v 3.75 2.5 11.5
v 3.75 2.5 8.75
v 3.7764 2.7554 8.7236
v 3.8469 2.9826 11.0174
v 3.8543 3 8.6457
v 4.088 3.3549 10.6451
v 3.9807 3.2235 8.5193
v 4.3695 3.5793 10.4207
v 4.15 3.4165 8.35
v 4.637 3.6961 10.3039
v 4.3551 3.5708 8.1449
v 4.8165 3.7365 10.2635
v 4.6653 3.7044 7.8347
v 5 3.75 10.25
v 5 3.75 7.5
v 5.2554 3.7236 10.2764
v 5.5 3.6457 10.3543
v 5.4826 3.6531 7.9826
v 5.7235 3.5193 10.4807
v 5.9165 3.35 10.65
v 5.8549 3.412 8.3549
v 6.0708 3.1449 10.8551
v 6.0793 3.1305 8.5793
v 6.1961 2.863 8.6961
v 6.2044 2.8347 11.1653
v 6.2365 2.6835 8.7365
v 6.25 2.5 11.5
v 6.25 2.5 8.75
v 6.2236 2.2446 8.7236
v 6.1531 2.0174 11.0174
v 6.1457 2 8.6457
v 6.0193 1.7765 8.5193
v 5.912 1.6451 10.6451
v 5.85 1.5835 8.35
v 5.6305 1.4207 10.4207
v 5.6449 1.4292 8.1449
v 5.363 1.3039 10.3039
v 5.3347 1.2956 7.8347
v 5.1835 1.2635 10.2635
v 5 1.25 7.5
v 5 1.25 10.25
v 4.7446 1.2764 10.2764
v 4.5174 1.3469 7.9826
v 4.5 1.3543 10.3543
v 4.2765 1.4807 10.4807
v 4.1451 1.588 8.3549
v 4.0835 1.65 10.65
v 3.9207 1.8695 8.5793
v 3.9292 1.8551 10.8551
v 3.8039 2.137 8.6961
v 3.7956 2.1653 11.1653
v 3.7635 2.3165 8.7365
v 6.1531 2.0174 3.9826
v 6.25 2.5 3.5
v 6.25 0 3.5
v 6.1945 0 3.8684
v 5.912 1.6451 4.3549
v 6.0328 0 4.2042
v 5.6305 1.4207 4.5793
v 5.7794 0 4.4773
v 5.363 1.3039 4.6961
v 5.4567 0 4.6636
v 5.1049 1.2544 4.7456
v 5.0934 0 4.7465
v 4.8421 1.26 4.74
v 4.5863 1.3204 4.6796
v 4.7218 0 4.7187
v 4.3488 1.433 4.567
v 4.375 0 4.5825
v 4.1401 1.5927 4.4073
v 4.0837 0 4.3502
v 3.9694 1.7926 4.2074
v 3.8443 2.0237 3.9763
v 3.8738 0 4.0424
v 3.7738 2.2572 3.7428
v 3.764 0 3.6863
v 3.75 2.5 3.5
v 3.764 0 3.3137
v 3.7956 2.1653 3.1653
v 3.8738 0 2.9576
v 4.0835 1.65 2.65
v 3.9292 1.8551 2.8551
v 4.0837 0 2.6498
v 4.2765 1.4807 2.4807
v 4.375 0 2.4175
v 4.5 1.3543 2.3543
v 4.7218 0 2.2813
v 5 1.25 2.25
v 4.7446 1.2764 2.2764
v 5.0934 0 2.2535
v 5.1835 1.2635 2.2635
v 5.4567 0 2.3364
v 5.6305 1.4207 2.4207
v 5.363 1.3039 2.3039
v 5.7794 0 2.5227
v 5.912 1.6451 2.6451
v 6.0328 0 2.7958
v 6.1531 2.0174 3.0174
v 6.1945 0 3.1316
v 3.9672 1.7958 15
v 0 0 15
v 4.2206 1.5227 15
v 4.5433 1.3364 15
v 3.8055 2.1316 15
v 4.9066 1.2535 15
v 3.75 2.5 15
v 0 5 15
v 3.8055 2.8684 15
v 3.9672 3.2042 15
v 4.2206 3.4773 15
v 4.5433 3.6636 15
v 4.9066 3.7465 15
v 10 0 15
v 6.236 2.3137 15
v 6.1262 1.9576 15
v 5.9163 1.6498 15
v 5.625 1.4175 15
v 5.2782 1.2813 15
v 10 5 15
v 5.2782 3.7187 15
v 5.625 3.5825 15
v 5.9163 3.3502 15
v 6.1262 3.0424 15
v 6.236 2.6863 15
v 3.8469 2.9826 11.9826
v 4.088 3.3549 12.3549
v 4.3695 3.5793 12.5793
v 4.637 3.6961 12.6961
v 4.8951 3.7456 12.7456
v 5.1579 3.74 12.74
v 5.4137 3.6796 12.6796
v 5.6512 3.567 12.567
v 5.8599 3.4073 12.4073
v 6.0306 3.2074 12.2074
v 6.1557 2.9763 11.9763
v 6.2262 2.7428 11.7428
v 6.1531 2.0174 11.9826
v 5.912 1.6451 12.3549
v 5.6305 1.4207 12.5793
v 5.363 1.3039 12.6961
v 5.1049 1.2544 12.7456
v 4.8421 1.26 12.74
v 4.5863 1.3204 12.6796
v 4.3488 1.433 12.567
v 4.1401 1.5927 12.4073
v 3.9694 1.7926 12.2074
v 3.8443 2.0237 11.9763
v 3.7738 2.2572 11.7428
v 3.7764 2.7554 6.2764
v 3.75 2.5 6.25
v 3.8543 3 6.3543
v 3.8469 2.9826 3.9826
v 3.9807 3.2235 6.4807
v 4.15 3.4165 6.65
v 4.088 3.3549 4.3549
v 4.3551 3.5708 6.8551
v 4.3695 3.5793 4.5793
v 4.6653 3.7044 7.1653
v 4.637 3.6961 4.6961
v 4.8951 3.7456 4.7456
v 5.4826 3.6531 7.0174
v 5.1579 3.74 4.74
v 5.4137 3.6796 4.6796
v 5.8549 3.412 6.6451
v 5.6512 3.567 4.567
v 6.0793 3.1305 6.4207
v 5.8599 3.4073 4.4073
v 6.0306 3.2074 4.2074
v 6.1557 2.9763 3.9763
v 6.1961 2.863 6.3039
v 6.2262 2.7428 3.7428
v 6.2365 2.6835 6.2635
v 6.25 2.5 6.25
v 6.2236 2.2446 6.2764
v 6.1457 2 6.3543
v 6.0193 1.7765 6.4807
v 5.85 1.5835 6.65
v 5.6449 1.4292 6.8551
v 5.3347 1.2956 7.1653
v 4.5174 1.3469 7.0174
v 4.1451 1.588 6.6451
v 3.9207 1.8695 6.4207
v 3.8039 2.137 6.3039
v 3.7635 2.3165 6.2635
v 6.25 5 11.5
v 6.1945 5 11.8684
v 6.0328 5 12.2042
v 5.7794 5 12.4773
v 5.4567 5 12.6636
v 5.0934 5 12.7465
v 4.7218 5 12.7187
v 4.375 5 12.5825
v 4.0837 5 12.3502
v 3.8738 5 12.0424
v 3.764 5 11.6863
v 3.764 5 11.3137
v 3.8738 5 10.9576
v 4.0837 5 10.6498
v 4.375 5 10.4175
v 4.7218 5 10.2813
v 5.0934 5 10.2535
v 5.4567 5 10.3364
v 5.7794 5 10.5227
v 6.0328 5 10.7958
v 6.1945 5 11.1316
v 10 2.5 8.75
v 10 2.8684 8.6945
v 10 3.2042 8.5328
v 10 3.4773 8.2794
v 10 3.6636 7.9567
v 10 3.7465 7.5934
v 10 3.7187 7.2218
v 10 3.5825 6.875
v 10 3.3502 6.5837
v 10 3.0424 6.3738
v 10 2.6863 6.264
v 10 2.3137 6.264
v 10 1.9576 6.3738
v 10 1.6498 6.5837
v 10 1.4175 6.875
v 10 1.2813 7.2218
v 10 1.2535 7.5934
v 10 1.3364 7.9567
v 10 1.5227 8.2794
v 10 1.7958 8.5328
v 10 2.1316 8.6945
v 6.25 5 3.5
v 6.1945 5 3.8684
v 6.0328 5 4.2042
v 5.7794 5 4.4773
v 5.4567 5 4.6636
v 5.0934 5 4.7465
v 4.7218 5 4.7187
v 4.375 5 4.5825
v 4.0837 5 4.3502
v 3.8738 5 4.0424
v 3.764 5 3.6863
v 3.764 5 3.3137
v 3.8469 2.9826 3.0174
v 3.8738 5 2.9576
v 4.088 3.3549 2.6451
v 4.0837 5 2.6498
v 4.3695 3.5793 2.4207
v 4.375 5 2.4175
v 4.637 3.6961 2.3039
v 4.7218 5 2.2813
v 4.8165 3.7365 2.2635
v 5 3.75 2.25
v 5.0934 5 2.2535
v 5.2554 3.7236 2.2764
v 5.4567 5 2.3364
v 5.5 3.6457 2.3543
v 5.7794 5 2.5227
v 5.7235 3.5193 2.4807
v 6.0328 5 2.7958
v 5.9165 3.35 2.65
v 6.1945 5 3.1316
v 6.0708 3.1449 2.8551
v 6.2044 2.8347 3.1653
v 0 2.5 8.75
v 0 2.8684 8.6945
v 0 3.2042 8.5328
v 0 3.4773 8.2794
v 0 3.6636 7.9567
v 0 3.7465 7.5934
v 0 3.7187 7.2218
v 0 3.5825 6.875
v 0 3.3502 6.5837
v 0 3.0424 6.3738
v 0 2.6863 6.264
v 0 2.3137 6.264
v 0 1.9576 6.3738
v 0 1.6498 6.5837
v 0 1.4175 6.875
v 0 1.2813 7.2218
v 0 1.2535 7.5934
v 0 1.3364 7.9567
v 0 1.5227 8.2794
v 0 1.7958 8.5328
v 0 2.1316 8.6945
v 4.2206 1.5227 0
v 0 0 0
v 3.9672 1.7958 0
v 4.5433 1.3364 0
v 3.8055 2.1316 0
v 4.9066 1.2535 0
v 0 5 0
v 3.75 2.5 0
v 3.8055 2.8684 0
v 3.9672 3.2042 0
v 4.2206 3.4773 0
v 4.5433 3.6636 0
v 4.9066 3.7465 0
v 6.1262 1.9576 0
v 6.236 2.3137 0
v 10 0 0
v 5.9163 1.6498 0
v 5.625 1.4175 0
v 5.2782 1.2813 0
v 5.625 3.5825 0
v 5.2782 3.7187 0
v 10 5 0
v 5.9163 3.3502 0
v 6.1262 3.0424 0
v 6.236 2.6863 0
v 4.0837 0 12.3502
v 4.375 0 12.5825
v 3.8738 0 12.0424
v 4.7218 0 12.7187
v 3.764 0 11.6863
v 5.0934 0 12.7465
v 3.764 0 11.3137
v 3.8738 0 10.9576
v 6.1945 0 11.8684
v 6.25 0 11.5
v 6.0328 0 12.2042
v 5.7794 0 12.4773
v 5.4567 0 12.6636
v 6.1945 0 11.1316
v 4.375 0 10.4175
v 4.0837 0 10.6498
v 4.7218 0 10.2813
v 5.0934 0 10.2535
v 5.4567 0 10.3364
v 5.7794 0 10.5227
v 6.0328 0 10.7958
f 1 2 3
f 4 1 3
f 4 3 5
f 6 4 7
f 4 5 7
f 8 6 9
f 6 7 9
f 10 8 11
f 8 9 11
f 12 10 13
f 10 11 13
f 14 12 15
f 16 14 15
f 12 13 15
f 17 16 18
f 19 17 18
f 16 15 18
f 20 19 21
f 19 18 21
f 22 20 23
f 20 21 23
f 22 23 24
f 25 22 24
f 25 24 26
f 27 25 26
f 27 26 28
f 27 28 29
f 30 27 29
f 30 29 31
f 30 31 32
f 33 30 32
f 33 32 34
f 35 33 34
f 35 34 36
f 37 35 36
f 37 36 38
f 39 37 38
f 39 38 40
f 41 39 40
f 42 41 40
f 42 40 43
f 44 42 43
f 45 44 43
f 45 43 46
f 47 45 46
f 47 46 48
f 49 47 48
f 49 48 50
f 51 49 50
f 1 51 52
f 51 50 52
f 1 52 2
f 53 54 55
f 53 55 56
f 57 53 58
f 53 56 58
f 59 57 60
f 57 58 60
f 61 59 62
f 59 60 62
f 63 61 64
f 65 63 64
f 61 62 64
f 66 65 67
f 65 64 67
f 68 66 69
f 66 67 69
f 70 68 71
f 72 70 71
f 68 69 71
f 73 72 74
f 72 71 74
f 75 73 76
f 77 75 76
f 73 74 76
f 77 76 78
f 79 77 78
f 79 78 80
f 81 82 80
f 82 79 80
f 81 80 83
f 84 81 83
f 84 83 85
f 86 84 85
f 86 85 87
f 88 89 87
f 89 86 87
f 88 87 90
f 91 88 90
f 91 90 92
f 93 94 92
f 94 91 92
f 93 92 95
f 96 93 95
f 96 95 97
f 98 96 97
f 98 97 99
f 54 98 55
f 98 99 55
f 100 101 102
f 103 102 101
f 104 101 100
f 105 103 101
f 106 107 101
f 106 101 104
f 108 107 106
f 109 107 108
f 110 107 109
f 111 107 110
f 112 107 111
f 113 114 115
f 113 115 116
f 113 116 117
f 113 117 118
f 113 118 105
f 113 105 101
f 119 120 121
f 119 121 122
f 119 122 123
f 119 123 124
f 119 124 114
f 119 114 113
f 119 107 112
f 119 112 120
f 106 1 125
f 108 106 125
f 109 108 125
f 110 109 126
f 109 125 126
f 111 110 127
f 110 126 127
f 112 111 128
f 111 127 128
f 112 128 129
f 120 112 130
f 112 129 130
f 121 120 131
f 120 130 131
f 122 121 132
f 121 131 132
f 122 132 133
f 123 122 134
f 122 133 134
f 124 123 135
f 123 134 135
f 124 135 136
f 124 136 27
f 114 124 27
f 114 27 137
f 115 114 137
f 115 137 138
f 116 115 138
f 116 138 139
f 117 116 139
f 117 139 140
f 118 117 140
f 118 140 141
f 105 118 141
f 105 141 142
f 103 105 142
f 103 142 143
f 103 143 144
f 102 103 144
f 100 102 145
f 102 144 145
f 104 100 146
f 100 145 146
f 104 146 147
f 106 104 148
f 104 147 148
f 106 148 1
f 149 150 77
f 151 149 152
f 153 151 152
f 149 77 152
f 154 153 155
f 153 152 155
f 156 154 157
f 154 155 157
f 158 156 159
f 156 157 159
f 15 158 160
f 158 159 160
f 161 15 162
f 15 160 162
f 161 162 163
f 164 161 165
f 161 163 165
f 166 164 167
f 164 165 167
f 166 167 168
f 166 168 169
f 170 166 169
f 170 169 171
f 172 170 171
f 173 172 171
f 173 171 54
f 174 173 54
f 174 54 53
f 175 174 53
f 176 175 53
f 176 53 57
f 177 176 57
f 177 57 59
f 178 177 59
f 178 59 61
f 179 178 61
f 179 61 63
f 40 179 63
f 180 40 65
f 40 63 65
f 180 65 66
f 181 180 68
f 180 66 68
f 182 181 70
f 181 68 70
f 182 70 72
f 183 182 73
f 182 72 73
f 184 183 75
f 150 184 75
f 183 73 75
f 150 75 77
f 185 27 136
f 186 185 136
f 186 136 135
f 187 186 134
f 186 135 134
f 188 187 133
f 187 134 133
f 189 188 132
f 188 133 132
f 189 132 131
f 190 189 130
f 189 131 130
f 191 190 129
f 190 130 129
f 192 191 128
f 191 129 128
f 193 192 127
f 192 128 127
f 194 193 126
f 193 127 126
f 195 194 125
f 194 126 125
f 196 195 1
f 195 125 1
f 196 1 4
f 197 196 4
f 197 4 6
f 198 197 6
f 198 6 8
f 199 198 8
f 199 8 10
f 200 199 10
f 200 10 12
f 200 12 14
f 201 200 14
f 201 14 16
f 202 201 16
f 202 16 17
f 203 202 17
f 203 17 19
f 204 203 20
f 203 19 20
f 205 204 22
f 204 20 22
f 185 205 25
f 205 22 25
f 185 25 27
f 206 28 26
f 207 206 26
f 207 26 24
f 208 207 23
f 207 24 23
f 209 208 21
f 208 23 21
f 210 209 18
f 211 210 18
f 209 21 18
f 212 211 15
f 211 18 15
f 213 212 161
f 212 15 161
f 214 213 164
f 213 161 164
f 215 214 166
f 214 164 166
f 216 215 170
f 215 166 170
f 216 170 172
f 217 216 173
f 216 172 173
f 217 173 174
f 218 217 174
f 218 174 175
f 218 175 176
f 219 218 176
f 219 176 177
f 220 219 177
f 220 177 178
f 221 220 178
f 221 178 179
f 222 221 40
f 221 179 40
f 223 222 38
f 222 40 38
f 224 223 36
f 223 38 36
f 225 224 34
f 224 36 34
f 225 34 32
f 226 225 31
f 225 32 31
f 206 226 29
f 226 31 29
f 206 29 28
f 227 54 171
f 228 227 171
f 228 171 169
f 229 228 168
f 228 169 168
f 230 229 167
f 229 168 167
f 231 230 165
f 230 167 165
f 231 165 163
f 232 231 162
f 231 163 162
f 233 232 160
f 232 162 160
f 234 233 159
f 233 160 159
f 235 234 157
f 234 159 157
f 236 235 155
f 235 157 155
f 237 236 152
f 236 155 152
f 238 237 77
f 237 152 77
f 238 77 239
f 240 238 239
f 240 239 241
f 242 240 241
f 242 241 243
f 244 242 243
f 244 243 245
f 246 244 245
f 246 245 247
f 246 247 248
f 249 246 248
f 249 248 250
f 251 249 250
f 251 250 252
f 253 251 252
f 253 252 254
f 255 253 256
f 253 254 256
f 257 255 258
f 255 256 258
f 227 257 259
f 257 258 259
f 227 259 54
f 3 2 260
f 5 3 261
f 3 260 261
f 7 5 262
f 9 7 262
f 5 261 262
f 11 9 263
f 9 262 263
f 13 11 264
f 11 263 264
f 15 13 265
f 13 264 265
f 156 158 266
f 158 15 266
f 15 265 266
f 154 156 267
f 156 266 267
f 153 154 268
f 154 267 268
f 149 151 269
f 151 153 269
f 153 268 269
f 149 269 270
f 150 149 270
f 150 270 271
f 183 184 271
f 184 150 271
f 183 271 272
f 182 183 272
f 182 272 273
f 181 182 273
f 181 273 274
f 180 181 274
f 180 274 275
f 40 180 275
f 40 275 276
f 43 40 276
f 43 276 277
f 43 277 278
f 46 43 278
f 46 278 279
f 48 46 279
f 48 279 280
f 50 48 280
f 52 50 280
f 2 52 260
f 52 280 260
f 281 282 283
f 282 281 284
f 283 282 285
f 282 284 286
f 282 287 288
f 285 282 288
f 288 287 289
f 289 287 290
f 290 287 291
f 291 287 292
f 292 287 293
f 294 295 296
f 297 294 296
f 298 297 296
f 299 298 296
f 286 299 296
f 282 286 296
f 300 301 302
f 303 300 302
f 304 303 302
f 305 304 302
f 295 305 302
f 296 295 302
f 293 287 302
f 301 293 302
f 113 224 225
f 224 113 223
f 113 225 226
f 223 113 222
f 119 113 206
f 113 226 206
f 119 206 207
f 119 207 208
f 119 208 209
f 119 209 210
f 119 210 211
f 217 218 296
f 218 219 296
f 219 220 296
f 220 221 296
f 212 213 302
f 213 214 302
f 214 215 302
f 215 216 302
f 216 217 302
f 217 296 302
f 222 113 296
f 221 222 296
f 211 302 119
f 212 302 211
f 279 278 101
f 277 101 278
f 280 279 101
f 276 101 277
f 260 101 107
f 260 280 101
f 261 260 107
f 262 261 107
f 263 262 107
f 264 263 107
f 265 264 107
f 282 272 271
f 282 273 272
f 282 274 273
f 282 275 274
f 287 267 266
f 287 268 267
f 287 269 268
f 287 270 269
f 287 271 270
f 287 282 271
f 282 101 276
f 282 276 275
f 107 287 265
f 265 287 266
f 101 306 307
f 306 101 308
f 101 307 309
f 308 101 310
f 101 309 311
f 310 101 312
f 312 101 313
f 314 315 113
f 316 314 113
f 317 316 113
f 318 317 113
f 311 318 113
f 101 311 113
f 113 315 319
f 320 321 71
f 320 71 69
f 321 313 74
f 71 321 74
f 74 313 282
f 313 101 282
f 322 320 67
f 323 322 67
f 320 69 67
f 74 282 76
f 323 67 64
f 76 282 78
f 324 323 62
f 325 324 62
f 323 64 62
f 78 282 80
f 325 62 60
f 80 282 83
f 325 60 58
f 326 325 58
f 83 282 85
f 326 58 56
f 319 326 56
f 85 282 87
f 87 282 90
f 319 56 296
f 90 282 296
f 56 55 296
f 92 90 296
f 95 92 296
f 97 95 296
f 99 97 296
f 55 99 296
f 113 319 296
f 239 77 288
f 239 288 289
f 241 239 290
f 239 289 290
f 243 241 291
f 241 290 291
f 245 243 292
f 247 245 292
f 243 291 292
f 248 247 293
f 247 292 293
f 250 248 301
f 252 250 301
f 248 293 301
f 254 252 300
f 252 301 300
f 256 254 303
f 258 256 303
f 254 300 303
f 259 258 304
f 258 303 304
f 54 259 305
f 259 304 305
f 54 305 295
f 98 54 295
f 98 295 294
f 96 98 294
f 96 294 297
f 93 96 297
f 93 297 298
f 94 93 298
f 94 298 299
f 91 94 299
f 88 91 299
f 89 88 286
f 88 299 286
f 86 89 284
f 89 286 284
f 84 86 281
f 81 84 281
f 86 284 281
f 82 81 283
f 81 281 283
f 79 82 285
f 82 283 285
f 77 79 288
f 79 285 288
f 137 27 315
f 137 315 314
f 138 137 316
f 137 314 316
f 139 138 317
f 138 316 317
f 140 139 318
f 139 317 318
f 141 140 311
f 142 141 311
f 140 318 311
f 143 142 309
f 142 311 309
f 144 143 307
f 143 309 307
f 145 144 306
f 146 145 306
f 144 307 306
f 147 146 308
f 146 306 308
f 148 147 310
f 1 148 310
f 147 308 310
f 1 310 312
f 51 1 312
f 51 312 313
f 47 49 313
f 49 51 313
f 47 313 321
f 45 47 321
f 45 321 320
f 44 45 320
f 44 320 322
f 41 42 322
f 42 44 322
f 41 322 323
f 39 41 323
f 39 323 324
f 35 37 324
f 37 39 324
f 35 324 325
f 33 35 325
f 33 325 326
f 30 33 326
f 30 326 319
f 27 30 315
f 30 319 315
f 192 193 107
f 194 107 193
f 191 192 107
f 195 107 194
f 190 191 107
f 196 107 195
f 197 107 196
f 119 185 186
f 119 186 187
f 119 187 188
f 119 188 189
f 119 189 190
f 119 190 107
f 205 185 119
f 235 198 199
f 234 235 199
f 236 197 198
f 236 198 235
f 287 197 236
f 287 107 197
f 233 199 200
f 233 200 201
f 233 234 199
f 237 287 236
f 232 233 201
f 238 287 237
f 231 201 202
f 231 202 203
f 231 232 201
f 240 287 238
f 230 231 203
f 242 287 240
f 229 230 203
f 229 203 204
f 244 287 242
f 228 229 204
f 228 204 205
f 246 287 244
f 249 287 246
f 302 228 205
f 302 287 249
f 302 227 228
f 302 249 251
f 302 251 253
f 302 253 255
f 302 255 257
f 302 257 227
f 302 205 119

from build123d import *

# Parameters (mm, degrees)
ESQUISSE1_W       = 10
ESQUISSE1_H       = 5
EXTRUSION1_DEPTH  = 15
TROU_TARAUD_M31_D = 2.5
TROU_TARAUD_M32_D = 2.5
TROU_TARAUD_M33_D = 2.5


with BuildPart() as part:
    # Esquisse1 → Extrusion1 (new body)
    with BuildSketch(Plane.XY):
        with Locations((5, 2.5)):
            Rectangle(ESQUISSE1_W, ESQUISSE1_H)
    extrude(amount=EXTRUSION1_DEPTH)

    # Trou taraudé M31 (through all)
    with Locations(Plane.XY.offset(15)):
        with Locations((5, 2.5)):
            Hole(TROU_TARAUD_M31_D / 2)

    # Trou taraudé M32 (through all)
    with Locations(Plane(origin=(10, 0, 0), x_dir=(0, 0, -1), z_dir=(1, 0, 0))):
        with Locations((-7.5, 2.5)):
            Hole(TROU_TARAUD_M32_D / 2)

    # Trou taraudé M33 (through all)
    with Locations(Plane(origin=(0, 5, 0), x_dir=(-1, 0, 0), z_dir=(0, 1, 0))):
        with Locations((-5, 11.5), (-5, 3.5)):
            Hole(TROU_TARAUD_M33_D / 2)


solid = part.part
